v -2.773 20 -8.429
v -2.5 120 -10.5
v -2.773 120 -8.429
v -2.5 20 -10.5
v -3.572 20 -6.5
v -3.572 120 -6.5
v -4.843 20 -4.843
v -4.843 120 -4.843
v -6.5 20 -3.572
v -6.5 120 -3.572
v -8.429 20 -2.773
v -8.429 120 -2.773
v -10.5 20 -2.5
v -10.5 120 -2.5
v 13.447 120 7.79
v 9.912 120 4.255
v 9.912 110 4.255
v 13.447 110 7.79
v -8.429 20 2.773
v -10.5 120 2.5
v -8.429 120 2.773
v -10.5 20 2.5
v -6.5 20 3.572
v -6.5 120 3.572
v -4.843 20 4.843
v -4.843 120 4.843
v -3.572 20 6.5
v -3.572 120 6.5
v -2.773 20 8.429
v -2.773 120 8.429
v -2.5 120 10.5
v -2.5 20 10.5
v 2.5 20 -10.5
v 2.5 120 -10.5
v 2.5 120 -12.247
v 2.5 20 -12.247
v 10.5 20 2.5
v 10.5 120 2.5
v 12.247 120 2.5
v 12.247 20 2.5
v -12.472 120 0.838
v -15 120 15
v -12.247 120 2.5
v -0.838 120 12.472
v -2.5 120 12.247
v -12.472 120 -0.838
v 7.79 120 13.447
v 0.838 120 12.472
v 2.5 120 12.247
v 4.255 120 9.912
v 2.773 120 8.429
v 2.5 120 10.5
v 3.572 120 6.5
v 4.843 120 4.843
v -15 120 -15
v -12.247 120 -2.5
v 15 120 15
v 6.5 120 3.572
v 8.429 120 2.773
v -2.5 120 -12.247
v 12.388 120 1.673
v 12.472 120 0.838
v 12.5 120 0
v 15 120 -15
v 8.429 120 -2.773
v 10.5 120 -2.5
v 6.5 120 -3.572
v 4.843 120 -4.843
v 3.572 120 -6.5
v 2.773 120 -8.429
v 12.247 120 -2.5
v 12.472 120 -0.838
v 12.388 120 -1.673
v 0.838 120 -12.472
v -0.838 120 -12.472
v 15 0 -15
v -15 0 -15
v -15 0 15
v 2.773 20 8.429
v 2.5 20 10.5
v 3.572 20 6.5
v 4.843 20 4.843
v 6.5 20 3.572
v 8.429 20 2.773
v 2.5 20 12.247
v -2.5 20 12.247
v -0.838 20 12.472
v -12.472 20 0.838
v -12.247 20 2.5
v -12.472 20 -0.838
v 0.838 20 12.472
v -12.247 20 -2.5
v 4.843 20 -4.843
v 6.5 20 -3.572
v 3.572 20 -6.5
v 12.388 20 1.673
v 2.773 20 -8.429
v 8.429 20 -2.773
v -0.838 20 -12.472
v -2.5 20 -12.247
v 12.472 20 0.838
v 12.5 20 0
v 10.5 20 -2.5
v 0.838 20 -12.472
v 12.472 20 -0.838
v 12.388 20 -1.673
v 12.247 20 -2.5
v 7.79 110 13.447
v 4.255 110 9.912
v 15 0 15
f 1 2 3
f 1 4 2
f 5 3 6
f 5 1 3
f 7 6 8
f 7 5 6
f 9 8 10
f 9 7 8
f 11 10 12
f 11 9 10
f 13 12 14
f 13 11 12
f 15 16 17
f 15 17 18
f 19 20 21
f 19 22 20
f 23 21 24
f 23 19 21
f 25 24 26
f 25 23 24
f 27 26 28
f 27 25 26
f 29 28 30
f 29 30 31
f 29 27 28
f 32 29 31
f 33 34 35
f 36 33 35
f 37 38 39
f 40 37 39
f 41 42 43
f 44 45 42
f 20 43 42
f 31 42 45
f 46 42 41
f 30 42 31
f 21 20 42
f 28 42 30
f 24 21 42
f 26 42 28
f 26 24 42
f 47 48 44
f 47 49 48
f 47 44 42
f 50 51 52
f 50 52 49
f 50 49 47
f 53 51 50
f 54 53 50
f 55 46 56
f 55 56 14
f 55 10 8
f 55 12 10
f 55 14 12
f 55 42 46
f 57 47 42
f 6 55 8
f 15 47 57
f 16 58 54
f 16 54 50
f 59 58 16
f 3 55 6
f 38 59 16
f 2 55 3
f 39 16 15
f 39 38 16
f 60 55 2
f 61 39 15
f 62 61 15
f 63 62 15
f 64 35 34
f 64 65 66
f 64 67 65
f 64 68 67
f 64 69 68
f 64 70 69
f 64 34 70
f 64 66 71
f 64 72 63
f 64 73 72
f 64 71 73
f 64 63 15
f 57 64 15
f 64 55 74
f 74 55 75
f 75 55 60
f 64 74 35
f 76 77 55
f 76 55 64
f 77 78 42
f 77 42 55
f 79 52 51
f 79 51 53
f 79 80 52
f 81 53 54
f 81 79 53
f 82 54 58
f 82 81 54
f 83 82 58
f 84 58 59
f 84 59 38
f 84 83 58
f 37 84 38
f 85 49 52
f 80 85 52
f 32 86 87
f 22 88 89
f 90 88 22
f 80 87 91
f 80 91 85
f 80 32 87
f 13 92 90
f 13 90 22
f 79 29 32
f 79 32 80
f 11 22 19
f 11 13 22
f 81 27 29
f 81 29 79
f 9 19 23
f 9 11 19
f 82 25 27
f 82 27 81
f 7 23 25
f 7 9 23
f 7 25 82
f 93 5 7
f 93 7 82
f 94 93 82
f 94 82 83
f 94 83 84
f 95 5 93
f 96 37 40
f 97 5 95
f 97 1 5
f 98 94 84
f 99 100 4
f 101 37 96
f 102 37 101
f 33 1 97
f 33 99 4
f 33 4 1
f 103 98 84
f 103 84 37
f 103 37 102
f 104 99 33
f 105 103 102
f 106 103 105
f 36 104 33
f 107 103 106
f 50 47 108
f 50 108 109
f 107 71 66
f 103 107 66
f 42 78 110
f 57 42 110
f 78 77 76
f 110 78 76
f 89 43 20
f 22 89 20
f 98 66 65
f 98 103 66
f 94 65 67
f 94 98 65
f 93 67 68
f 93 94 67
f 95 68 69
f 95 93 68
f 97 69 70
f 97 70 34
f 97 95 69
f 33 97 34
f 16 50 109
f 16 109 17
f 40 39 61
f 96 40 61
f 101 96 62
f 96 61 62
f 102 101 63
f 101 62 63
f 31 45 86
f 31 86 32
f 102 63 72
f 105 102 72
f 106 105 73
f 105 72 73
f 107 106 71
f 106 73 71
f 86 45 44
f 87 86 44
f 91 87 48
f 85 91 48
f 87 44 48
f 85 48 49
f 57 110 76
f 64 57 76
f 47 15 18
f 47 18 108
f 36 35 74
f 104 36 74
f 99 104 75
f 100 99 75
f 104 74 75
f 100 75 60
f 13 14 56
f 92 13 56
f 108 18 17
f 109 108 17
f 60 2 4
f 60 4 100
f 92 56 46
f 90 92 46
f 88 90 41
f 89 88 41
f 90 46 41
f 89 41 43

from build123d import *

# Parameters (mm, degrees)
SKETCH_1_W          = 30
SKETCH_1_H          = 30
EXTRUDE_1_DEPTH     = 120
SKETCH_2_W          = 9.747448714
SKETCH_2_H          = 5
SKETCH_2_W_2        = 5
SKETCH_2_H_2        = 9.747448714
CUT_EXTRUDE_1_DEPTH = 100
FILLET_1_R          = 8
CUT_EXTRUDE_2_DEPTH = 10


with BuildPart() as part:
    # 草图1 → 凸台-拉伸1 (new body)
    with BuildSketch(Plane(origin=(0, 0, 0), x_dir=(1, 0, 0), z_dir=(0, 1, 0))):
        Rectangle(SKETCH_1_W, SKETCH_1_H)
    extrude(amount=EXTRUDE_1_DEPTH)

    # 草图2 → 切除-拉伸1 (cut)
    with BuildSketch(Plane(origin=(0, 120, 0), x_dir=(1, 0, 0), z_dir=(0, 1, 0))):
        with Locations((-7.373724357, 0)):
            Rectangle(SKETCH_2_W, SKETCH_2_H)
        Rectangle(SKETCH_2_W_2, SKETCH_2_H)
        with Locations((0, -7.373724357)):
            Rectangle(SKETCH_2_W_2, SKETCH_2_H_2)
        with Locations((7.373724357, 0)):
            Rectangle(SKETCH_2_W, SKETCH_2_H)
        with Locations((0, 7.373724357)):
            Rectangle(SKETCH_2_W_2, SKETCH_2_H_2)
        with BuildLine():
            ThreePointArc((-12.247448714, 2.5), (-12.5, 0), (-12.247448714, -2.5))
            Line((-12.247448714, -2.5), (-12.247448714, 2.5))
        make_face()
        with BuildLine():
            ThreePointArc((2.5, 12.247448714), (0, 12.5), (-2.5, 12.247448714))
            Line((-2.5, 12.247448714), (2.5, 12.247448714))
        make_face()
        with BuildLine():
            Line((12.247448714, 2.5), (12.247448714, -2.5))
            ThreePointArc((12.247448714, -2.5), (12.436701913, -1.256362025), (12.5, 0))
            ThreePointArc((12.5, 0), (12.436701913, 1.256362025), (12.247448714, 2.5))
        make_face()
        with BuildLine():
            Line((2.5, -12.247448714), (-2.5, -12.247448714))
            ThreePointArc((-2.5, -12.247448714), (0, -12.5), (2.5, -12.247448714))
        make_face()
    extrude(amount=-CUT_EXTRUDE_1_DEPTH, mode=Mode.SUBTRACT)

    # 圆角1
    fillet_1_edges = [part.edges().sort_by_distance(p)[0] for p in [
        (-2.5, 70, -2.5),
        (2.5, 70, -2.5),
        (2.5, 70, 2.5),
        (-2.5, 70, 2.5),
    ]]
    fillet(fillet_1_edges, radius=FILLET_1_R)

    # 草图4 → 切除-拉伸2 (cut)
    with BuildSketch(Plane(origin=(0, 120, 0), x_dir=(1, 0, 0), z_dir=(0, 1, 0))):
        Polygon((4.254858786, -9.911713035), (9.911713035, -4.254858786), (13.447246941, -7.790392692), (7.790392692, -13.447246941), align=None)
    extrude(amount=-CUT_EXTRUDE_2_DEPTH, mode=Mode.SUBTRACT)


solid = part.part
